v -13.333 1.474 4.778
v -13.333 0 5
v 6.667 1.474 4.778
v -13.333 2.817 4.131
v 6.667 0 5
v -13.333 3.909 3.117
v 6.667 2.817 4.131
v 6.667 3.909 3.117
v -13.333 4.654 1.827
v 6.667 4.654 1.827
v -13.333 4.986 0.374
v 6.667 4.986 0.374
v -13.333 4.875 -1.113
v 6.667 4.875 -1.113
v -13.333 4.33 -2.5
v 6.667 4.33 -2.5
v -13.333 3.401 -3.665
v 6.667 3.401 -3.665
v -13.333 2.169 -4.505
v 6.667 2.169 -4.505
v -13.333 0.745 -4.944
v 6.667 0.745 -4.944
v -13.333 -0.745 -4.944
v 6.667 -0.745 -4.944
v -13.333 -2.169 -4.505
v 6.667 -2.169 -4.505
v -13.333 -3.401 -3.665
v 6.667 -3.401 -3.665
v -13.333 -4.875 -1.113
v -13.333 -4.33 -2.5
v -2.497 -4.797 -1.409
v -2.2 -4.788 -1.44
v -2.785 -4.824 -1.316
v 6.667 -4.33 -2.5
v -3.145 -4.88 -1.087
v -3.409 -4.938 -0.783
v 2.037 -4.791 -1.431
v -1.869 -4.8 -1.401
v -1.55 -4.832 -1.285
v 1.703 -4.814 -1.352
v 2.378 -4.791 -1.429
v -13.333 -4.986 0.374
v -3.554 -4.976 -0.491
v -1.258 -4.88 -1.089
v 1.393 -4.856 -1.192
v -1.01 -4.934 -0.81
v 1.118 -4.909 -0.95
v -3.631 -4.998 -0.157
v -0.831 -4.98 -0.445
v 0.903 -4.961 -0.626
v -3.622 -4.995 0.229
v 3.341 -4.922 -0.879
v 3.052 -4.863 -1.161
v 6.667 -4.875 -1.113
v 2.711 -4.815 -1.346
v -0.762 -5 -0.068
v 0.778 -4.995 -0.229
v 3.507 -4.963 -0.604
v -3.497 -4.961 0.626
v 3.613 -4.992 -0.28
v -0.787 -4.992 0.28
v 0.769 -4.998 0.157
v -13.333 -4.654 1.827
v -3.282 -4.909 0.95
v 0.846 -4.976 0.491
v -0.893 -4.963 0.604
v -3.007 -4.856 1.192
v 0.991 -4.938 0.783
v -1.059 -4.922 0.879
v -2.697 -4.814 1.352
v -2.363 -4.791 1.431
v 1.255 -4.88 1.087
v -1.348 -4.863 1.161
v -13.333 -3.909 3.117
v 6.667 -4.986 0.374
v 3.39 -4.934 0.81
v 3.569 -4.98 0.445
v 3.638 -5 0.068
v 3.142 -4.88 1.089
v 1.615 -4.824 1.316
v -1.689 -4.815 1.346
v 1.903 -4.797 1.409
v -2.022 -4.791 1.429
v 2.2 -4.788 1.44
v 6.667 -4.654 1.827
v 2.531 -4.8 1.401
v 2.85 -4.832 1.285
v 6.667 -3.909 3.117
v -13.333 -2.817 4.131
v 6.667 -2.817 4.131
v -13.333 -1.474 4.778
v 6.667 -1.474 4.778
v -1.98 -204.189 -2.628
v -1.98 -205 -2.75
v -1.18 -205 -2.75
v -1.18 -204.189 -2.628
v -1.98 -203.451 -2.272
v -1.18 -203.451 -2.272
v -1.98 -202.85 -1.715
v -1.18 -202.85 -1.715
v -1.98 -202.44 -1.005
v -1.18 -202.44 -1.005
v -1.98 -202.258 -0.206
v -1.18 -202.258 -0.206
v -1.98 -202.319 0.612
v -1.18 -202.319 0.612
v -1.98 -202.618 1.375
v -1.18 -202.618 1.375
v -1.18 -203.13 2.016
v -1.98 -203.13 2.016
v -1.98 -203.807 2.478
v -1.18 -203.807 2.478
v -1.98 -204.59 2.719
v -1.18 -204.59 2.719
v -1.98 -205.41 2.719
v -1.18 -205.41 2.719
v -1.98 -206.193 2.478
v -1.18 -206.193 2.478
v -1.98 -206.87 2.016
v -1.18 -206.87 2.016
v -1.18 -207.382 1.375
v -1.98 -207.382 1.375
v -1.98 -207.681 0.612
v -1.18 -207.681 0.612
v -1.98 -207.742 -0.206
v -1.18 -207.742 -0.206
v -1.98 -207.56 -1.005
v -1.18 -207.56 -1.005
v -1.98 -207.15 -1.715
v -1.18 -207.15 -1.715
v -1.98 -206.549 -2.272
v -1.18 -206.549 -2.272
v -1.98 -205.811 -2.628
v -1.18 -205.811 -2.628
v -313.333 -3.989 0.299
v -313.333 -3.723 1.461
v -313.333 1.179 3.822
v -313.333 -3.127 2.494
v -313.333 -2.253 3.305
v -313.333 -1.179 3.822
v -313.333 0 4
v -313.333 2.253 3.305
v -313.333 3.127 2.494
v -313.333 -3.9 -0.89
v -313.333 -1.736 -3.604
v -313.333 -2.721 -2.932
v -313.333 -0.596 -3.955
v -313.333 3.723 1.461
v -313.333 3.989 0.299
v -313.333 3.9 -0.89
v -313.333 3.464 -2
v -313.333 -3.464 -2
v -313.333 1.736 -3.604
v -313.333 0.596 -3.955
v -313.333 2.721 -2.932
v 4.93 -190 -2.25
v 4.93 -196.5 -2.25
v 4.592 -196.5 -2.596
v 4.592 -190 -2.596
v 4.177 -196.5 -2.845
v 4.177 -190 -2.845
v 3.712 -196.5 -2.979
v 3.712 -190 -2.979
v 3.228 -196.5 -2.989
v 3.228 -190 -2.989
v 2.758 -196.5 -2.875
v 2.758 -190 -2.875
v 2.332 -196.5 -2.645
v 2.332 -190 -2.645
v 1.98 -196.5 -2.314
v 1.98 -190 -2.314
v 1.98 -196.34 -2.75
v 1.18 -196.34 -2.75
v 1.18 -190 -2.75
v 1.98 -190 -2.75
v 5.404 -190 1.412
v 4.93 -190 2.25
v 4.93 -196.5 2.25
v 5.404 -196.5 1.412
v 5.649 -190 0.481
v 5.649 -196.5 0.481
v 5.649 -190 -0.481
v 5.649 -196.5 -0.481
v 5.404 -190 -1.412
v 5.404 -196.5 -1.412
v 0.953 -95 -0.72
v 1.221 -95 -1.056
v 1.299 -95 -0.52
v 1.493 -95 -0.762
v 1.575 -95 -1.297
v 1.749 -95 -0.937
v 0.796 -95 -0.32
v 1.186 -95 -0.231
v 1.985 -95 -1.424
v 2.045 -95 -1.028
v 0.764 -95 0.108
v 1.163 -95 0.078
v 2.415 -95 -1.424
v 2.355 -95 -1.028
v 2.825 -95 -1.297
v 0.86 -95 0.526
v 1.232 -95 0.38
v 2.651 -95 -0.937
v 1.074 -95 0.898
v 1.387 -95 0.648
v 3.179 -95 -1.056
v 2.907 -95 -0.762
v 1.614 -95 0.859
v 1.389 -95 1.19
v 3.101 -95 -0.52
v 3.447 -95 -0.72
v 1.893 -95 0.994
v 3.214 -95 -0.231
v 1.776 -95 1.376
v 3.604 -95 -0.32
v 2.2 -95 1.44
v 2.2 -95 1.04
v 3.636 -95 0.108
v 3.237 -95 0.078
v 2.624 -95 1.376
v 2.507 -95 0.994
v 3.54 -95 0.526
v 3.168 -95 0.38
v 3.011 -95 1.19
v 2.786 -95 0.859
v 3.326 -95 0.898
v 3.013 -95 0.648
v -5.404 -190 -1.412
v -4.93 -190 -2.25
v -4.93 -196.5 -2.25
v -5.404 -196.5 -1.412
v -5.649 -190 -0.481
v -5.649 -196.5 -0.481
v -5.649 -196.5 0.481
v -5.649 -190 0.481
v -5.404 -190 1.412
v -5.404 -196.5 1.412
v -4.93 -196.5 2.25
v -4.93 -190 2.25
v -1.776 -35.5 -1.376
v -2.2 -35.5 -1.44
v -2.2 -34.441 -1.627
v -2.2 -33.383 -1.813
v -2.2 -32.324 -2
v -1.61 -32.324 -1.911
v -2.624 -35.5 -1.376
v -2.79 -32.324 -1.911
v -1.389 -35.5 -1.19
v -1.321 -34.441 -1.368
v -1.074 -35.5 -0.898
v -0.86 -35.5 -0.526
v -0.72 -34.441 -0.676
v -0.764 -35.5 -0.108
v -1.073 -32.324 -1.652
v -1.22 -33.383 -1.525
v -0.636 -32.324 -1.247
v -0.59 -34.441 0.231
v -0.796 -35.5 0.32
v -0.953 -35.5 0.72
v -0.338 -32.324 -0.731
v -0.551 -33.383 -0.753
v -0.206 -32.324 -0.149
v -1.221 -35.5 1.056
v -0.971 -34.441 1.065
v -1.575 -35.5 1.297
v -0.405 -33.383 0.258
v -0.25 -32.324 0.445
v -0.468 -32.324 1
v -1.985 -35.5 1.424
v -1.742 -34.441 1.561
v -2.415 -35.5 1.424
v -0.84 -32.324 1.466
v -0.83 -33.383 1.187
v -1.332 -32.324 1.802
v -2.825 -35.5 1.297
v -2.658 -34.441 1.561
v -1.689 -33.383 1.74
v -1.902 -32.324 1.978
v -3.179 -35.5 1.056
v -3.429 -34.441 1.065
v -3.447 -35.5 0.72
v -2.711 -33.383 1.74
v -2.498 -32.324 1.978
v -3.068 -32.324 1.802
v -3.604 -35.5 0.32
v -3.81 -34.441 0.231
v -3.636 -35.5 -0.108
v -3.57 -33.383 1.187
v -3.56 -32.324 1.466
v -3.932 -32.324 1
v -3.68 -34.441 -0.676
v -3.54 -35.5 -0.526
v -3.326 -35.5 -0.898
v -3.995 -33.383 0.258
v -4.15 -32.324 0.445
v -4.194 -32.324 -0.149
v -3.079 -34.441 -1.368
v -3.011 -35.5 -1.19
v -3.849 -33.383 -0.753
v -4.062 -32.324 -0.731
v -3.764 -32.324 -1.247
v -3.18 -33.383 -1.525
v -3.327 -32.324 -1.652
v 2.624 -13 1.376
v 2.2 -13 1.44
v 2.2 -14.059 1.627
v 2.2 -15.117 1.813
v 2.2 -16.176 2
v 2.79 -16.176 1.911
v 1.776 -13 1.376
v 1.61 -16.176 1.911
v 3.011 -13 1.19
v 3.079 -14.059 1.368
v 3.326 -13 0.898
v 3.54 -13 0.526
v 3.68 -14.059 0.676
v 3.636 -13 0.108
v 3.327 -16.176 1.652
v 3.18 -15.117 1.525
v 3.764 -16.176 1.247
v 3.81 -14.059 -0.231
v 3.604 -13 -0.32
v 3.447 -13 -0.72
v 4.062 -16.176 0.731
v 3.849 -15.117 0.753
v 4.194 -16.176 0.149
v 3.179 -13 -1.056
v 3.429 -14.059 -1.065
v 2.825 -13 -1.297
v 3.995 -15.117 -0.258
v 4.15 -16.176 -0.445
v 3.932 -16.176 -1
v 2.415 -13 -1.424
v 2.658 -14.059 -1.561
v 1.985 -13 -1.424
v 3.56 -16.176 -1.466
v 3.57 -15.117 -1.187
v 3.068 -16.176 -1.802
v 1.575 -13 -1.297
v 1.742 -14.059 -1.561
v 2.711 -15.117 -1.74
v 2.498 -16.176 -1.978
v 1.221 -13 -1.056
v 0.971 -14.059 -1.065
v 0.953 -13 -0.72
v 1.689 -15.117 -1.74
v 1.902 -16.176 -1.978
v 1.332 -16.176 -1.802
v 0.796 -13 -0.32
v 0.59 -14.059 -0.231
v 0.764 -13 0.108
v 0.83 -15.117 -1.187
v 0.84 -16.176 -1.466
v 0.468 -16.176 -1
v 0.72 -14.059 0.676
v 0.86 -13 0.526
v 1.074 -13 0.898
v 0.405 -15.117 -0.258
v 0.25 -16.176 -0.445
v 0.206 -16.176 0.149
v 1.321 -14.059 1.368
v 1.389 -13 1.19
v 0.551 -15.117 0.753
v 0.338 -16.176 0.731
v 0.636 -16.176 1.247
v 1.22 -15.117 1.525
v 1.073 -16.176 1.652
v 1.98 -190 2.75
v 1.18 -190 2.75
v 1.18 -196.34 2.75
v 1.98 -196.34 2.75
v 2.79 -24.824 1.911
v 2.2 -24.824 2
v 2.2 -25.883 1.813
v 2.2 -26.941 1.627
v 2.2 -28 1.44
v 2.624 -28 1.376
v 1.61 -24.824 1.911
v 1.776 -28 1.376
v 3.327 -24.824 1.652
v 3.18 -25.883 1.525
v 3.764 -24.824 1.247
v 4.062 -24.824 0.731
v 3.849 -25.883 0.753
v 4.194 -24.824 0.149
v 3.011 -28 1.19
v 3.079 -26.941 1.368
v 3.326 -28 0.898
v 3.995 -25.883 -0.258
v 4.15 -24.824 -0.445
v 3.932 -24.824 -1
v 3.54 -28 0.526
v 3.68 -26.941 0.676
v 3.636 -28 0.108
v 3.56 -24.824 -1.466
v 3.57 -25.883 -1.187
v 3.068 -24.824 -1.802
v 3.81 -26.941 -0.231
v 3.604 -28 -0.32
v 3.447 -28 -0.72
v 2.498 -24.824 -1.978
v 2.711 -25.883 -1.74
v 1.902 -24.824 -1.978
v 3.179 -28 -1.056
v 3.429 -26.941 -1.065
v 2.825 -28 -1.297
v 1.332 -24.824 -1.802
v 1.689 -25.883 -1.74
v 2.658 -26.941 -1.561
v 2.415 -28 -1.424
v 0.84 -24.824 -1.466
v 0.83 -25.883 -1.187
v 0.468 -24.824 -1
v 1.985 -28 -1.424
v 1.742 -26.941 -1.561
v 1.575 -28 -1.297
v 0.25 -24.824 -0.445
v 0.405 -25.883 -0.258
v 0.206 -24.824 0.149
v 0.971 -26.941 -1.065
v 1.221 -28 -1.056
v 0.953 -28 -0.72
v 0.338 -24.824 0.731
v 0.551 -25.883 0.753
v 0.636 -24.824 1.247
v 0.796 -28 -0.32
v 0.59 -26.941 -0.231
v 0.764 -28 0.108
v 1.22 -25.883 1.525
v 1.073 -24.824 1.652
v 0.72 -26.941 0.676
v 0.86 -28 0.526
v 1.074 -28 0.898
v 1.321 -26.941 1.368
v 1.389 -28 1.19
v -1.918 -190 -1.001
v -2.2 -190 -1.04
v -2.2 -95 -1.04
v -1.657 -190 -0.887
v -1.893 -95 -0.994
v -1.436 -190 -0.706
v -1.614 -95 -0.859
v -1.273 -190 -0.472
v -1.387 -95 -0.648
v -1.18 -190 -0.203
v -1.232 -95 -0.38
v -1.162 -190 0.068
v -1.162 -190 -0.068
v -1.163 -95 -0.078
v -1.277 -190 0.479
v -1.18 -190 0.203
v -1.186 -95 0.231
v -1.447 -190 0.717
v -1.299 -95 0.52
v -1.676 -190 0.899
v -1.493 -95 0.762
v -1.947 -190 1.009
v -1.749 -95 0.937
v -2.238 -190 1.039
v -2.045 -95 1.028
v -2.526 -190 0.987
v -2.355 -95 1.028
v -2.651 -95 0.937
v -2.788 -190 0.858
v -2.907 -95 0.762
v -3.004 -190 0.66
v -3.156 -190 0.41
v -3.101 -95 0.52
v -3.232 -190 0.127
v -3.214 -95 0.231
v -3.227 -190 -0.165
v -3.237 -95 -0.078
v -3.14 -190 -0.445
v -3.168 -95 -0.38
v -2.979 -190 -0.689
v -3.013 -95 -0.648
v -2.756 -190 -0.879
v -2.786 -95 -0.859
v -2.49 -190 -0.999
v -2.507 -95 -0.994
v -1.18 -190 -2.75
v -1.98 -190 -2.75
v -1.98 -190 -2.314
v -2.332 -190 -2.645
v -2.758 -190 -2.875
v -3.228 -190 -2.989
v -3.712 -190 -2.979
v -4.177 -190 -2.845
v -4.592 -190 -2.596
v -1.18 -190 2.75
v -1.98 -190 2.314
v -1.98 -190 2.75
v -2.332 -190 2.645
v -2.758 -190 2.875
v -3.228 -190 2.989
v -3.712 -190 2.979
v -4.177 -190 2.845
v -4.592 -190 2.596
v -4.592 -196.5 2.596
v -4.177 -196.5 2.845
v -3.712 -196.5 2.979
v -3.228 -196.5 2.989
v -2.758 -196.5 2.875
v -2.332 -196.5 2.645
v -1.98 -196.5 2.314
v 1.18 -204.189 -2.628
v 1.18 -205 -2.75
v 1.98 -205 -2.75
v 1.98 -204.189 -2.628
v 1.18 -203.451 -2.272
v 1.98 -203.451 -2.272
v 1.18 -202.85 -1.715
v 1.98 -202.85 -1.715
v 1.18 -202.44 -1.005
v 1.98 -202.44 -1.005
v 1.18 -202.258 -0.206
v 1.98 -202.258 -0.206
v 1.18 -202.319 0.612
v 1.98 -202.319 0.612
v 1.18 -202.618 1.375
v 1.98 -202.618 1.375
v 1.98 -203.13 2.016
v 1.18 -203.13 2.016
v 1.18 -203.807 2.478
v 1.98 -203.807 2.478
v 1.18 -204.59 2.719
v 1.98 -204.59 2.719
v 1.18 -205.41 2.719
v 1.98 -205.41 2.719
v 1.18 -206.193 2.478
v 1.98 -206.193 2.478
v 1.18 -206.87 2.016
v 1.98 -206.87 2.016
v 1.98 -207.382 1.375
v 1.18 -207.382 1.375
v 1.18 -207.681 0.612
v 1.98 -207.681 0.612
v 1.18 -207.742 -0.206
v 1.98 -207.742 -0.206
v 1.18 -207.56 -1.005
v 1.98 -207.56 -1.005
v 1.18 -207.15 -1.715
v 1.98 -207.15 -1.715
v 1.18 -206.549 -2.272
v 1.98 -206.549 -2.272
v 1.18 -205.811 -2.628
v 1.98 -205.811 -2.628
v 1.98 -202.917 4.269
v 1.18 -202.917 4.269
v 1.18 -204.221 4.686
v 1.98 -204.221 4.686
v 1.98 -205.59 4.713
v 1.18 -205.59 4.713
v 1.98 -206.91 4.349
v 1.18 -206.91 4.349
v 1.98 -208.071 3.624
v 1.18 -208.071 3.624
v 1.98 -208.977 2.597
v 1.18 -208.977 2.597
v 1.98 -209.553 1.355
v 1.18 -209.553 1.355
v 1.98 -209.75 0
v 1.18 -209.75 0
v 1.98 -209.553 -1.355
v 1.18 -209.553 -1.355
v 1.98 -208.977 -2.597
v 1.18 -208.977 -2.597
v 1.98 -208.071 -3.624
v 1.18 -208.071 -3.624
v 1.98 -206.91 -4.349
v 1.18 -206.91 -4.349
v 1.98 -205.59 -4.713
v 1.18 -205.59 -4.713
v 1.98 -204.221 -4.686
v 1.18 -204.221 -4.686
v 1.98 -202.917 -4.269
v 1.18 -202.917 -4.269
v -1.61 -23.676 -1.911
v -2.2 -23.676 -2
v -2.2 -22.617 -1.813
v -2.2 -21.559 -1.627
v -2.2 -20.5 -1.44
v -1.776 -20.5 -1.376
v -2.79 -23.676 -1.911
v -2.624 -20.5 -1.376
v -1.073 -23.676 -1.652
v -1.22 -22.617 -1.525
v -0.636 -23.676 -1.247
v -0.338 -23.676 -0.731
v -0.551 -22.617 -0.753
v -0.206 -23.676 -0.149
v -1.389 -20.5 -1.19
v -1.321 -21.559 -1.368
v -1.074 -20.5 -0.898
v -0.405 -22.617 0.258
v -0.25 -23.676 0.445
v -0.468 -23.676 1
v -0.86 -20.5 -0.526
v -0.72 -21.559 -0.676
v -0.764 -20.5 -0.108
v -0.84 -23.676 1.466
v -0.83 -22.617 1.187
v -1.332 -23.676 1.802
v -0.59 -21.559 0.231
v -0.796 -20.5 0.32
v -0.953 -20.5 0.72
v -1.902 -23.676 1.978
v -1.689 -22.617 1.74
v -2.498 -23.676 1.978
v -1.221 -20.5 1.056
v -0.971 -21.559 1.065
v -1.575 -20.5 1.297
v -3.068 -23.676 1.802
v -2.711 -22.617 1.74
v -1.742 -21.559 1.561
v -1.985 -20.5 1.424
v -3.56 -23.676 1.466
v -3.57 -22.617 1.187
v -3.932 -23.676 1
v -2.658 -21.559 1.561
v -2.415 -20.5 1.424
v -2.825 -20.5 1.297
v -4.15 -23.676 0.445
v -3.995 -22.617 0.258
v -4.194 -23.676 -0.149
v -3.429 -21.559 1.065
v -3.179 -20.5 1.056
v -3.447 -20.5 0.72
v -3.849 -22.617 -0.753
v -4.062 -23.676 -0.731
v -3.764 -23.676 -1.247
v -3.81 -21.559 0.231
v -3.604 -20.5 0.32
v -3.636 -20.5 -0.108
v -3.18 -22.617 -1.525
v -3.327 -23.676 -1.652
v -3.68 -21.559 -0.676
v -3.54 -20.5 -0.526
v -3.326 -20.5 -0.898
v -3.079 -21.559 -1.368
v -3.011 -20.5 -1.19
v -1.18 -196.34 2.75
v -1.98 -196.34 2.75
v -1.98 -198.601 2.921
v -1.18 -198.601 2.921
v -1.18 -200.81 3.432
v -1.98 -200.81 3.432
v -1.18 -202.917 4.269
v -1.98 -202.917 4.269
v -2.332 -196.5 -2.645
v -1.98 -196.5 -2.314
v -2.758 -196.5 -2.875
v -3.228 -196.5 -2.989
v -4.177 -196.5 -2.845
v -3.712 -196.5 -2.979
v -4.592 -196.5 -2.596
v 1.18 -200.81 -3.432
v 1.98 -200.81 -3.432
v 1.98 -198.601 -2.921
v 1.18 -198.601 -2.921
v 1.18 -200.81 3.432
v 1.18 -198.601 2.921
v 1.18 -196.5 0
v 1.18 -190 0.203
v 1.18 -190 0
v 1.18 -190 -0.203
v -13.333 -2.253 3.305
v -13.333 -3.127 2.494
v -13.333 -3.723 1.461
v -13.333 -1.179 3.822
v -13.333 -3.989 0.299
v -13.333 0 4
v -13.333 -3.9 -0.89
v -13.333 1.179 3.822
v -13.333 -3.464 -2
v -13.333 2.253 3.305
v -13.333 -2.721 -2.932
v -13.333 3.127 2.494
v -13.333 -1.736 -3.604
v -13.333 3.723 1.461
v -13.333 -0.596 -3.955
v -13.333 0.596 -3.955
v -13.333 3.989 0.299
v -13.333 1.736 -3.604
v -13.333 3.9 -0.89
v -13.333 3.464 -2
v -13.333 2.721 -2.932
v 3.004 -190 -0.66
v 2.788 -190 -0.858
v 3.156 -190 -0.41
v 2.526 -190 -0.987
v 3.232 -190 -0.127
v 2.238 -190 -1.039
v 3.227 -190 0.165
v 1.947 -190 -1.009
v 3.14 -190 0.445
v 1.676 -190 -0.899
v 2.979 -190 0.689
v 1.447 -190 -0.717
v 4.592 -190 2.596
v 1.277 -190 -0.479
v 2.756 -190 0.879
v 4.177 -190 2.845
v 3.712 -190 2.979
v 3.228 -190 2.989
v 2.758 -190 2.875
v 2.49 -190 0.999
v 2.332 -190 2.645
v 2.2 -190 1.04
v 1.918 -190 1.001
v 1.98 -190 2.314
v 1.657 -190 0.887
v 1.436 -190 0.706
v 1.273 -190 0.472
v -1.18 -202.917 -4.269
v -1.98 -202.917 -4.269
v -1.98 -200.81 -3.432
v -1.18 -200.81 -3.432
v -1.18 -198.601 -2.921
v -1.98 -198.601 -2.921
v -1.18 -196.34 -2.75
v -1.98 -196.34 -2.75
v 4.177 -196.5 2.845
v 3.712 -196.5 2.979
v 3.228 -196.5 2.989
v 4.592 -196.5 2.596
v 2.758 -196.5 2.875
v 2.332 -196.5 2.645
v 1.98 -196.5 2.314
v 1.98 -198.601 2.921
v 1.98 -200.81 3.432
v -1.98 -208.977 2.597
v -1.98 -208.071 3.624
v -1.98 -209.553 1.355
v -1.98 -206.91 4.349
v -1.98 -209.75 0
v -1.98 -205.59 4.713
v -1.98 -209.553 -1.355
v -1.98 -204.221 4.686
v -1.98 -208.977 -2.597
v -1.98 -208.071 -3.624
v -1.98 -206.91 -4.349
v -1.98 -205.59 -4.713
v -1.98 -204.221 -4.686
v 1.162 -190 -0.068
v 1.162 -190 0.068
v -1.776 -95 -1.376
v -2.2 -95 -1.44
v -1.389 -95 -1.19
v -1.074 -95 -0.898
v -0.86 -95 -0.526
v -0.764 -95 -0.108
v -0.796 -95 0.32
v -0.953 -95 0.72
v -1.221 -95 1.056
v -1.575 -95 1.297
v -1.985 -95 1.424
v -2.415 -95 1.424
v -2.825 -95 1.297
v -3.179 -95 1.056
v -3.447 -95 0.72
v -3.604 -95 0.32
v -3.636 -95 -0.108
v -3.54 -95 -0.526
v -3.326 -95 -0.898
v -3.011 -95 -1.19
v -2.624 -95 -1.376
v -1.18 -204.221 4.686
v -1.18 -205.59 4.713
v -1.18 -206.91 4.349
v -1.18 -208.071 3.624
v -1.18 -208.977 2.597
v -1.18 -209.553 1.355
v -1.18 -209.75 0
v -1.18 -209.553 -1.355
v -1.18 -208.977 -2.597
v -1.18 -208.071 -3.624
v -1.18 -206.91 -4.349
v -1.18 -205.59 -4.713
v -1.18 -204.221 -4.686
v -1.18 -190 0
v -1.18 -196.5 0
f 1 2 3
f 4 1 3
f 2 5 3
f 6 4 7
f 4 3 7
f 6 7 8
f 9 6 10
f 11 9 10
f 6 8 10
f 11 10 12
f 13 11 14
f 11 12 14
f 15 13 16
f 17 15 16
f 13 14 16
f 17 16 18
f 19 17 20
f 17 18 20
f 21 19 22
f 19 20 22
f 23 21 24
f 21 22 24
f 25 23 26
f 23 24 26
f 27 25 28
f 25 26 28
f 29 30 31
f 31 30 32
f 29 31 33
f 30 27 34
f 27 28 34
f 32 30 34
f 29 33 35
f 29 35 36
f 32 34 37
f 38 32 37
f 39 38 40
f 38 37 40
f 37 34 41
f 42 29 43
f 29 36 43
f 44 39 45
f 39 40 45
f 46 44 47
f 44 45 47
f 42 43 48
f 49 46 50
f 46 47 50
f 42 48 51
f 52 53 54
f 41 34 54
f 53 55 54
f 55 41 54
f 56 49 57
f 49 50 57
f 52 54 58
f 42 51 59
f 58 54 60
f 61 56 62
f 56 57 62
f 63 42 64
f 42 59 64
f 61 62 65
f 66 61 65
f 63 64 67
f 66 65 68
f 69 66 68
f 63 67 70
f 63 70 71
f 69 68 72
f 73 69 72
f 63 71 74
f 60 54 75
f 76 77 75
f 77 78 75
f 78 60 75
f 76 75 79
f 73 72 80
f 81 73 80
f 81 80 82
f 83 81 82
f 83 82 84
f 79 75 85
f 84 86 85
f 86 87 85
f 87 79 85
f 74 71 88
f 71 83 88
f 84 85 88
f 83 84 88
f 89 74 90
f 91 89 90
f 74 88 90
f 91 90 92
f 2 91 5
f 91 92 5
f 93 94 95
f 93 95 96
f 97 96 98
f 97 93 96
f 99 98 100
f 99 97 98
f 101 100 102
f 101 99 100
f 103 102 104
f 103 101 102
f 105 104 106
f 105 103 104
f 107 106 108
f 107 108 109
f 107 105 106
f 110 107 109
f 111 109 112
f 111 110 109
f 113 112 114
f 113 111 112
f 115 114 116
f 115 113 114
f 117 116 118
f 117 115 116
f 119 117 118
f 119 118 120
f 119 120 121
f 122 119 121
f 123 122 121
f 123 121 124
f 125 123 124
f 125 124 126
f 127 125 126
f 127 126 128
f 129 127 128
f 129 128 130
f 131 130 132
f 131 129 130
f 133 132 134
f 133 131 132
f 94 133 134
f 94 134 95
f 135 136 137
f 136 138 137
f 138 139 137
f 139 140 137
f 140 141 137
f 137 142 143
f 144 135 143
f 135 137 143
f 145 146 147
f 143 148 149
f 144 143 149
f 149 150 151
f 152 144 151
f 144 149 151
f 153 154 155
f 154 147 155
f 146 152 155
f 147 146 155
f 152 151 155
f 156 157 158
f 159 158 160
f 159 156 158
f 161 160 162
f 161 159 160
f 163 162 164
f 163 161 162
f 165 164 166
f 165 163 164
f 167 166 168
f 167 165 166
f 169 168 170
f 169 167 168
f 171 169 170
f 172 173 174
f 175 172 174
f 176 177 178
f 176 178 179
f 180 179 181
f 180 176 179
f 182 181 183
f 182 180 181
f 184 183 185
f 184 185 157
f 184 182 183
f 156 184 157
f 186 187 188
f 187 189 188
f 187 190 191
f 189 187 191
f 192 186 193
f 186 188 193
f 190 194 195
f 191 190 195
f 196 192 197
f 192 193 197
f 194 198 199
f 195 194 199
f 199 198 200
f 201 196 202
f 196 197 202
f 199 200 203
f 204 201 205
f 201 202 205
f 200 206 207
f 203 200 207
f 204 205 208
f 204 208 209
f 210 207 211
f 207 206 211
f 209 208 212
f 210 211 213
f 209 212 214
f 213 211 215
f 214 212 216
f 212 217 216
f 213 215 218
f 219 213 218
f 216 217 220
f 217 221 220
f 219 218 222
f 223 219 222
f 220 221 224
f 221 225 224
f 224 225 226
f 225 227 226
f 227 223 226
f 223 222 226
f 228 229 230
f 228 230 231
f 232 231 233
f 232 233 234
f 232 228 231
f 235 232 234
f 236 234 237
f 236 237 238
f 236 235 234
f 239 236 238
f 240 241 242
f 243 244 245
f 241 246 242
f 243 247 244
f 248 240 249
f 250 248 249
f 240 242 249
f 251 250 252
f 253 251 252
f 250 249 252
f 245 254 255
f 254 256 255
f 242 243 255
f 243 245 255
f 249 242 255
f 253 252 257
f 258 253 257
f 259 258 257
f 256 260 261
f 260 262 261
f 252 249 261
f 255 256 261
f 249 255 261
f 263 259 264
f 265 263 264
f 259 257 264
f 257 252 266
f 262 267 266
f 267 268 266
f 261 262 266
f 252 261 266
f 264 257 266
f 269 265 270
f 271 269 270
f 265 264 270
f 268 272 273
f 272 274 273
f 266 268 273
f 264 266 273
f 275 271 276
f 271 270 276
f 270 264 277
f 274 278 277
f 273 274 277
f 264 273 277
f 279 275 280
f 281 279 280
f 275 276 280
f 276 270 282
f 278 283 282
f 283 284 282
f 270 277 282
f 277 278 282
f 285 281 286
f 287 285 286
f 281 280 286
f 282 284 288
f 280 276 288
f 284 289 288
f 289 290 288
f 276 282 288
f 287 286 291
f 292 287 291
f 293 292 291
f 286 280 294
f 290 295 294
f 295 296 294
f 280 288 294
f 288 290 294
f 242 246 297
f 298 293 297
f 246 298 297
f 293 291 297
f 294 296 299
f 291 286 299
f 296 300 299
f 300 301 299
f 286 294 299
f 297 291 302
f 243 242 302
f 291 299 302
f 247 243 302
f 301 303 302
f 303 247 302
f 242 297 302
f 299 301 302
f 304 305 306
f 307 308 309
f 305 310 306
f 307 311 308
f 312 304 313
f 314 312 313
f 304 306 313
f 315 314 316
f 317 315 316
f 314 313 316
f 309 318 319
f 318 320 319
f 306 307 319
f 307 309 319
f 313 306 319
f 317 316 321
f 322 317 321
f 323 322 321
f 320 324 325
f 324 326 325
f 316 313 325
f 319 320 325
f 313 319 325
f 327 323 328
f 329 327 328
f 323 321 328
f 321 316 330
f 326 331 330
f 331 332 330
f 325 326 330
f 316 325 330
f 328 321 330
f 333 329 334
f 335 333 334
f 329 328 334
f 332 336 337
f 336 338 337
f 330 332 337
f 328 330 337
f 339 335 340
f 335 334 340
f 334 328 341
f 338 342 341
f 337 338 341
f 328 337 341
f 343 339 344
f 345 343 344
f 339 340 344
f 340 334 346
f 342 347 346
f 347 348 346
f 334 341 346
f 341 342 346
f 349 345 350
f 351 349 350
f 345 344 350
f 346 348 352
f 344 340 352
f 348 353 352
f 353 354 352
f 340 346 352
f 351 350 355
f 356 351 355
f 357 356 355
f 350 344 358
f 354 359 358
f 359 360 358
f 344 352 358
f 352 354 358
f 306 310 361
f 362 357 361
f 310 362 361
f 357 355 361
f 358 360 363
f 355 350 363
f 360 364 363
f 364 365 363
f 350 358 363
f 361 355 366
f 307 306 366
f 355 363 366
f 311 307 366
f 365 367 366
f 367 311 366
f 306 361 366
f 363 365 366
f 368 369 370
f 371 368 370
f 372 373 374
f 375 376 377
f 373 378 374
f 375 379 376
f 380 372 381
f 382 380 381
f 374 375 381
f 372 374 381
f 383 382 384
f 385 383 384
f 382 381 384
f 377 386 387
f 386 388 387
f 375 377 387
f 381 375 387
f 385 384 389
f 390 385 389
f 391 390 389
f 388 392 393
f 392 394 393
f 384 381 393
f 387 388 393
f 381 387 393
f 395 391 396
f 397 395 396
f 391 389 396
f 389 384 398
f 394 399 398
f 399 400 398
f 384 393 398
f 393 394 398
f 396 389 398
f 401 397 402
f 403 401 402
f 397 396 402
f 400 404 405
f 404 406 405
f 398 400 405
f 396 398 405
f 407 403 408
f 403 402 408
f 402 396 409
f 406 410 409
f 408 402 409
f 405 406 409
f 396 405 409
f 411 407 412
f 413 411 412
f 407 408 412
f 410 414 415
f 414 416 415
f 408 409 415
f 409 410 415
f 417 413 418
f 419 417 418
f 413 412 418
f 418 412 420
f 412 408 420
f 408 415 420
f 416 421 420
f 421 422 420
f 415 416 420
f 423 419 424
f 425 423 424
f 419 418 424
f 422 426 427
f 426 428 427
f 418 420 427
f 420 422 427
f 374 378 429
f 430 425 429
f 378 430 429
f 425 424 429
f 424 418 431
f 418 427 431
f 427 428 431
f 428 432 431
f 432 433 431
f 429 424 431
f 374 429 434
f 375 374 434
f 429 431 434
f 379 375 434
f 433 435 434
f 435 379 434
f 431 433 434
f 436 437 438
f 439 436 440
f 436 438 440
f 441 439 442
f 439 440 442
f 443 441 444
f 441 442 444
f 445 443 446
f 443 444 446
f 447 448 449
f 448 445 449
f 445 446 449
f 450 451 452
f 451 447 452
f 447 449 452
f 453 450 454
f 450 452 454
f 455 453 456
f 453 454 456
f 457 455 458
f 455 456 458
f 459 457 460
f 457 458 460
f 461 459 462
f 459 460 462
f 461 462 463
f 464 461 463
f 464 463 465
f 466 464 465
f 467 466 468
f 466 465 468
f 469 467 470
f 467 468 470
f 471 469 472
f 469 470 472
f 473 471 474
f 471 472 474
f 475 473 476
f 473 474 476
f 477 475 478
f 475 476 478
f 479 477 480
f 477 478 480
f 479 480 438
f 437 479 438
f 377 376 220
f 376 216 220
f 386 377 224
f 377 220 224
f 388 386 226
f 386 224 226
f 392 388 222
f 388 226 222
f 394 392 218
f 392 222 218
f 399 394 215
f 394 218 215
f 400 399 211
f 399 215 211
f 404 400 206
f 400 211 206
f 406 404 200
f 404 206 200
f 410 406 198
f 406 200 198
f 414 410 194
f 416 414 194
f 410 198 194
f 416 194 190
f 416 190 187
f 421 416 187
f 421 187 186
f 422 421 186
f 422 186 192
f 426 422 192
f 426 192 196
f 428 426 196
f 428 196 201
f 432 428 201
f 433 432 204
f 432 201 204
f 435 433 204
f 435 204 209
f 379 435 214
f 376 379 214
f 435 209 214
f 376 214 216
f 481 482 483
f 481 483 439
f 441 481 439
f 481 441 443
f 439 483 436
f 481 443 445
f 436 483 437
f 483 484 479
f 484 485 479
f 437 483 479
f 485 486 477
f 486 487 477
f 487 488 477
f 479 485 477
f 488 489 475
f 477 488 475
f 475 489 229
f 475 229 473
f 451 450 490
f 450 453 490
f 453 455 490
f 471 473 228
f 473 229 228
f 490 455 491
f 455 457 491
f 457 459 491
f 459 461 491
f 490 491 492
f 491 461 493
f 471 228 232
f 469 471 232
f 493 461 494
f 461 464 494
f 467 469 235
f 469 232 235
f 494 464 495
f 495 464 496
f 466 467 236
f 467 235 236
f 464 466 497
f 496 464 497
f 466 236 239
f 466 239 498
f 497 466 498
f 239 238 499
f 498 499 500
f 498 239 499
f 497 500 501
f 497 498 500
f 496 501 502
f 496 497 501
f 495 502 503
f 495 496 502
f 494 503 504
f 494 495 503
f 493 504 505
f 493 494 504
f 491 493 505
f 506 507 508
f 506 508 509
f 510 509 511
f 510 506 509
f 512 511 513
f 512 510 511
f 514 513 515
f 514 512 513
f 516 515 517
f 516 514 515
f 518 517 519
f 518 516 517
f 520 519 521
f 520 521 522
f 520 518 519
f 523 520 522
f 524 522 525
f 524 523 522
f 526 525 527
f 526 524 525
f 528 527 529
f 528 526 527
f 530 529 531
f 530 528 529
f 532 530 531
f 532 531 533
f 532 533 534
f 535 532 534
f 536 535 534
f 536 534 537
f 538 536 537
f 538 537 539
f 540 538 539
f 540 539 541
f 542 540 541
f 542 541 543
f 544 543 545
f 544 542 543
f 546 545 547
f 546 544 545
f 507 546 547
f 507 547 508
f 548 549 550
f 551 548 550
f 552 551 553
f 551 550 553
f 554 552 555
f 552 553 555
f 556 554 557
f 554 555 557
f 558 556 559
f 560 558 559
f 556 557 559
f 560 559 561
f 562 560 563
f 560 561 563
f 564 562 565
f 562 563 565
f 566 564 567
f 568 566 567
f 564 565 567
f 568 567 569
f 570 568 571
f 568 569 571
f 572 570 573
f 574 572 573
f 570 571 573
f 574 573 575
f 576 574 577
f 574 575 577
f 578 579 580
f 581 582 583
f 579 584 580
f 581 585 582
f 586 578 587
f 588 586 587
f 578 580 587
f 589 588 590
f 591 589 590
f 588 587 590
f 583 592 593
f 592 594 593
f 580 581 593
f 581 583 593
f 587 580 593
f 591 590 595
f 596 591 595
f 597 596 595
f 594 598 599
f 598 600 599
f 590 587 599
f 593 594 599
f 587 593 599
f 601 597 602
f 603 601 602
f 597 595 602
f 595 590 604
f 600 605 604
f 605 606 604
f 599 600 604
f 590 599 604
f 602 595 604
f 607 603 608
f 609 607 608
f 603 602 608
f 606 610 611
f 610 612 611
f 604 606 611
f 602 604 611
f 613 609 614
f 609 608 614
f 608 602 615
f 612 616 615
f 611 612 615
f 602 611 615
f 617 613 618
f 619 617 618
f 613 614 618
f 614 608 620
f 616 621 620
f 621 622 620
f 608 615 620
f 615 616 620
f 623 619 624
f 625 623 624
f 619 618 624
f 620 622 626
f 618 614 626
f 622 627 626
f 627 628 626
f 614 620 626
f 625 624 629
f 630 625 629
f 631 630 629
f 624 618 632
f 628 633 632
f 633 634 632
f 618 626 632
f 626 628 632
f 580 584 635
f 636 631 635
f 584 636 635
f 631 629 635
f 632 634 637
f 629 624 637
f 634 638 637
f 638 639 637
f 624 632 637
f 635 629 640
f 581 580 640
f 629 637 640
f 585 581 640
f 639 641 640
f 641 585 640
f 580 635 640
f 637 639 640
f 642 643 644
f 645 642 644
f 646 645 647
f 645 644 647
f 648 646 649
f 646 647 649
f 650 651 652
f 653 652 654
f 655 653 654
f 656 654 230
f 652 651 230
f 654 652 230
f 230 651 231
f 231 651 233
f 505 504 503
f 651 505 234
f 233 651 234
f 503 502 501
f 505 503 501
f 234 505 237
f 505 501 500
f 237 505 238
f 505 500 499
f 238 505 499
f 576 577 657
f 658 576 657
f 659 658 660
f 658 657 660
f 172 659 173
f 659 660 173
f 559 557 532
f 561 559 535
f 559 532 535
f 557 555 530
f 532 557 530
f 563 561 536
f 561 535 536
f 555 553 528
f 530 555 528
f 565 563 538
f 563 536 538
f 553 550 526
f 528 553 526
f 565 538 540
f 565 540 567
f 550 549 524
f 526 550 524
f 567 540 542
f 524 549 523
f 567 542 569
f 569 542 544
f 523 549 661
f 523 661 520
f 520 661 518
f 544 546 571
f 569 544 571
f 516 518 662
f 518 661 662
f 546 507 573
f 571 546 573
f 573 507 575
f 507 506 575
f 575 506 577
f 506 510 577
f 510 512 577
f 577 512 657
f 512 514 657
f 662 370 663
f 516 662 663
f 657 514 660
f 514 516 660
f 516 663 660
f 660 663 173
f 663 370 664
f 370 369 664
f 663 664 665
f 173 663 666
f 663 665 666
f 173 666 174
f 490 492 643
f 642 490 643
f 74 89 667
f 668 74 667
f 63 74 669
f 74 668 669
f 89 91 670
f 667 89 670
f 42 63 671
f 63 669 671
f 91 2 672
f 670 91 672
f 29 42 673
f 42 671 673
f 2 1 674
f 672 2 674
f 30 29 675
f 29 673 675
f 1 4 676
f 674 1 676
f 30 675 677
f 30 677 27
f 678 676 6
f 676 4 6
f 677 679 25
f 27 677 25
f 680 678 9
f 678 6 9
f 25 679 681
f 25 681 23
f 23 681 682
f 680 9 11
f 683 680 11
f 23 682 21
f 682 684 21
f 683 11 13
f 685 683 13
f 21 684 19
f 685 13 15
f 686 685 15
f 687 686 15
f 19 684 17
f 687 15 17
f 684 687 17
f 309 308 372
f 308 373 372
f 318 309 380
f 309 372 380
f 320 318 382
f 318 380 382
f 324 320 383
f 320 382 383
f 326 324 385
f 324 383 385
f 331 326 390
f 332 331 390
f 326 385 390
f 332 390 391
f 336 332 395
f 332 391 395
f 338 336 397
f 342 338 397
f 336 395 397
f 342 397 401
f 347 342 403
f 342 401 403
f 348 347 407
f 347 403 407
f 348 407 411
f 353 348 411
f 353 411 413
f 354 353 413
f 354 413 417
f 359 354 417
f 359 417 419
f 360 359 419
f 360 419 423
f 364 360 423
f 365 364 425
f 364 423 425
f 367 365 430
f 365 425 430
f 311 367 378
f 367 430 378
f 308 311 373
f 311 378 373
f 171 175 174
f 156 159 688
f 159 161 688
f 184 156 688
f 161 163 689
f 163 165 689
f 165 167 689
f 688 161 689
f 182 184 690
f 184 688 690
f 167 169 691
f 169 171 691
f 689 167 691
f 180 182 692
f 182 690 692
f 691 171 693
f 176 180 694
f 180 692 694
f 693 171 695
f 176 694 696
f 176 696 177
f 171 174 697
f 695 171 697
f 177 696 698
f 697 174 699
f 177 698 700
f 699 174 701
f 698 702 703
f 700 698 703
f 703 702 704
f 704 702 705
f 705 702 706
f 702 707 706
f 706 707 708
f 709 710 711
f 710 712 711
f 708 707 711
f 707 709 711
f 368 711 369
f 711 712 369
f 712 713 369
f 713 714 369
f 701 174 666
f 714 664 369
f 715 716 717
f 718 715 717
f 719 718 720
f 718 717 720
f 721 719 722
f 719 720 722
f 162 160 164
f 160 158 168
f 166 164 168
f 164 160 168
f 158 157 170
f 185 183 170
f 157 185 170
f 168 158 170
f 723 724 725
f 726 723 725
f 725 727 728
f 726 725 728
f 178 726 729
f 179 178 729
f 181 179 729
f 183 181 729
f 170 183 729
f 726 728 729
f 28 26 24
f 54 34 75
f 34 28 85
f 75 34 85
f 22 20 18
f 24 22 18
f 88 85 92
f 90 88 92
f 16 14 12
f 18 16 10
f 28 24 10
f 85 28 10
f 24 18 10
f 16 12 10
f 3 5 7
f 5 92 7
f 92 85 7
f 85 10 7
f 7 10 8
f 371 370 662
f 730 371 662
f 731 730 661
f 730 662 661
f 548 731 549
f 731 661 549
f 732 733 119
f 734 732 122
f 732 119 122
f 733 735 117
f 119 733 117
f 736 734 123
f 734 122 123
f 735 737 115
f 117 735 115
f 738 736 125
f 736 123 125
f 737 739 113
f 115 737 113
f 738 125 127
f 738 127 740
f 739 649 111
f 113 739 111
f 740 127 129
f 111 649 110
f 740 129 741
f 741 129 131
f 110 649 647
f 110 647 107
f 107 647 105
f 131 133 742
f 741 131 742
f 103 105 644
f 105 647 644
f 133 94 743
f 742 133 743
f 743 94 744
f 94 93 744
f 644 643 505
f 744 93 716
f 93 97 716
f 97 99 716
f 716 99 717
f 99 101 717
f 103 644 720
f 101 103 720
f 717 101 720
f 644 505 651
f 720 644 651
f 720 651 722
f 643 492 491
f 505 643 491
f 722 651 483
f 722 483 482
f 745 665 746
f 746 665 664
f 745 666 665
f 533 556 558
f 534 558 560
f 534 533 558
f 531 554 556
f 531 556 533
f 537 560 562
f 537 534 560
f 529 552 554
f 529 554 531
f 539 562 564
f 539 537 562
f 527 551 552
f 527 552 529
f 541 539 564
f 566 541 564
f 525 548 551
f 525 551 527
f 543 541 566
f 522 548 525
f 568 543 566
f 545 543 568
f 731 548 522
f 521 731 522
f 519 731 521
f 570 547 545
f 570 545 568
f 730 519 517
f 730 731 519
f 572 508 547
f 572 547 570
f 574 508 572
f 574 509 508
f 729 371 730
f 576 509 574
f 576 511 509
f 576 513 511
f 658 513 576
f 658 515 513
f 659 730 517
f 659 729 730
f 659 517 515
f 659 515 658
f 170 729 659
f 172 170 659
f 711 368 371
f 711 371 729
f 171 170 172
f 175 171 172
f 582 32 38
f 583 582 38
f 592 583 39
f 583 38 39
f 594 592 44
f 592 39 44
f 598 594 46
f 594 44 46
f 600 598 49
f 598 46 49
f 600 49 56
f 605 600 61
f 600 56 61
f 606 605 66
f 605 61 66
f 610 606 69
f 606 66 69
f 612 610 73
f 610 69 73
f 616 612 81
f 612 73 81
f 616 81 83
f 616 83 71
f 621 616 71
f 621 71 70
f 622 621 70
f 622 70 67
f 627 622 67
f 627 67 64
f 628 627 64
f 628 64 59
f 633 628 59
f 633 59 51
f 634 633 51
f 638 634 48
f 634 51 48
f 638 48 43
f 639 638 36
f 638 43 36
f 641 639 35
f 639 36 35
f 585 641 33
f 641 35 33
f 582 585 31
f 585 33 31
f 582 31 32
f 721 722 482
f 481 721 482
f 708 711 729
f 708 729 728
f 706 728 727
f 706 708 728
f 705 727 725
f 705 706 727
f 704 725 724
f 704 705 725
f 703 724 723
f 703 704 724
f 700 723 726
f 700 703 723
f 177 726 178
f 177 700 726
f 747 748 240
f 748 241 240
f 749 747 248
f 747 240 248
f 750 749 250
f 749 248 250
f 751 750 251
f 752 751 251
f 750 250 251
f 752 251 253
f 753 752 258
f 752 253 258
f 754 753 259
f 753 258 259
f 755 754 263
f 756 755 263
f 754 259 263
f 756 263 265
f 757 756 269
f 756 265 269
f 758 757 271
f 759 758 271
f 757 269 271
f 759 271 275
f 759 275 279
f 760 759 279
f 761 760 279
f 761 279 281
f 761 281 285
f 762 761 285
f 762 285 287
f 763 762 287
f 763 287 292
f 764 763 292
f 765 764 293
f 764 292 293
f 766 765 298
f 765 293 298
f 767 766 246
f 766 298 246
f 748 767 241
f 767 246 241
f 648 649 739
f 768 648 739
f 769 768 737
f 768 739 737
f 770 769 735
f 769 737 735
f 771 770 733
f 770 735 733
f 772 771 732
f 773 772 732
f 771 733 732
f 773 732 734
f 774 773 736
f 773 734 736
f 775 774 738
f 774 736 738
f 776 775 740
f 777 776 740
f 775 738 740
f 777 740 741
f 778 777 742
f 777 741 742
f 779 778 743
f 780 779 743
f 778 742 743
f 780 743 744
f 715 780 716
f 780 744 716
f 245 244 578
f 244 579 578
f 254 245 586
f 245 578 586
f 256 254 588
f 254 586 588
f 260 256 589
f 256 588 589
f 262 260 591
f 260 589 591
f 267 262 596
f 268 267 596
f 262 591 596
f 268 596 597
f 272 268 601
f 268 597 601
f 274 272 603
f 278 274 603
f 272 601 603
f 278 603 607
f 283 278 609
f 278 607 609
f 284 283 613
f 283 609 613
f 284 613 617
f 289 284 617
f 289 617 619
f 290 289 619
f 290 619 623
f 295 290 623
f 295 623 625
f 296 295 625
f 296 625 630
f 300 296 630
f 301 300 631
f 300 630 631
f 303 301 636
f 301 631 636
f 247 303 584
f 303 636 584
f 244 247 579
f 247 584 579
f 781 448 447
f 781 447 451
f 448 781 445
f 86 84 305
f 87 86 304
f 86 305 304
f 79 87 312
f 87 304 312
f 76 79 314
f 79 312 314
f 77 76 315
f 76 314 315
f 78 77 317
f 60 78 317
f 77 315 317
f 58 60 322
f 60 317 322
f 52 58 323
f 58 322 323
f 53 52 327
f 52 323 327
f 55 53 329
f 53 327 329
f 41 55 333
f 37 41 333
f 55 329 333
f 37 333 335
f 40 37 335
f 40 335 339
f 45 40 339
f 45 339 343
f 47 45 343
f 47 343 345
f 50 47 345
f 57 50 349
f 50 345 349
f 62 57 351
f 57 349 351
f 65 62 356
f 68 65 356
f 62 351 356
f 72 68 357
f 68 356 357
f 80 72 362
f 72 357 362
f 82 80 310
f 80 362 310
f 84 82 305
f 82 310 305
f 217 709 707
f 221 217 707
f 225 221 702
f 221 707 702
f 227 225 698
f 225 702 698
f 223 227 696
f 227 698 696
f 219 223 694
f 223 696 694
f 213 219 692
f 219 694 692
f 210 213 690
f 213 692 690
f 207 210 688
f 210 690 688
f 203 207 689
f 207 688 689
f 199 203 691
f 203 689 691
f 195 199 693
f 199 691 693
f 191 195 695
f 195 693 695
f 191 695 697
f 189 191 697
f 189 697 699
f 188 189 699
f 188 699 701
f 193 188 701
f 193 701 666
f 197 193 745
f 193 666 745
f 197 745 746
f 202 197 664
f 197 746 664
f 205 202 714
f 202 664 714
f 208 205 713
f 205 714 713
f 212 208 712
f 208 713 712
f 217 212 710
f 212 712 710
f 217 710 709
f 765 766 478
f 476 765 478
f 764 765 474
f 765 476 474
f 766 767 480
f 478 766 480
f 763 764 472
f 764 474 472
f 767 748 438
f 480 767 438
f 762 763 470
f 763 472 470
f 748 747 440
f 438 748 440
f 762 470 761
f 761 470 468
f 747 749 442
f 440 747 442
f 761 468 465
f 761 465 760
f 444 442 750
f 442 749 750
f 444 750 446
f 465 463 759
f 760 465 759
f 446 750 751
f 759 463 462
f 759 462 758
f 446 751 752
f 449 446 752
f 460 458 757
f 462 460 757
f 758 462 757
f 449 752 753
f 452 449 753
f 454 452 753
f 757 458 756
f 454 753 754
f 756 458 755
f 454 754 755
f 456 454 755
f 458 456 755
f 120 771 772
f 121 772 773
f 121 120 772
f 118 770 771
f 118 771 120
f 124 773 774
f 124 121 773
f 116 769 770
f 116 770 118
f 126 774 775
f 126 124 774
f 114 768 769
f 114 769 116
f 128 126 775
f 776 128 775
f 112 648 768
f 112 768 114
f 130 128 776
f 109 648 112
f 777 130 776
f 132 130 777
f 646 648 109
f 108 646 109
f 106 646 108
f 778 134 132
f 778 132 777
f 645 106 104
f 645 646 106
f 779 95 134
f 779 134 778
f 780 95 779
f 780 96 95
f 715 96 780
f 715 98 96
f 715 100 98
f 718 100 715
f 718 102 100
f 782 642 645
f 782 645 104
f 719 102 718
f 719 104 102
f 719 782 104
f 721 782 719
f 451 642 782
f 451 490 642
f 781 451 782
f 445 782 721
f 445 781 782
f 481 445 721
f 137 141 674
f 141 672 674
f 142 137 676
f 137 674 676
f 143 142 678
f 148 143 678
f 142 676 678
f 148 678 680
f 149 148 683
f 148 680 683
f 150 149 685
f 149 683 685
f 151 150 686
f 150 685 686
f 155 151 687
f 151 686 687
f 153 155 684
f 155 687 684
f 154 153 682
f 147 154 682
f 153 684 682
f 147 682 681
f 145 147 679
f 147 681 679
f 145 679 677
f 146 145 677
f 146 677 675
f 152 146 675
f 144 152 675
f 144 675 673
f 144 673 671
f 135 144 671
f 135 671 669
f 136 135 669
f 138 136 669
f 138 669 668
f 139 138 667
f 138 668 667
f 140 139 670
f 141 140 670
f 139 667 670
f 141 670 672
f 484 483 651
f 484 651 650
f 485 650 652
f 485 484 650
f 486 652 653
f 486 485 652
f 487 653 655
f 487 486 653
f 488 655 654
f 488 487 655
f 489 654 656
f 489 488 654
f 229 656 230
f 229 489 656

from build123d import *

# Parameters (mm, degrees)
SKETCH4_R           = 25.817449465
CUT_EXTRUDE1_DEPTH  = 20
BOSS_EXTRUDE2_DEPTH = 6.5
BOSS_EXTRUDE3_DEPTH = 6.5
SKETCH7_R           = 2.75
BOSS_EXTRUDE4_DEPTH = 0.8
BOSS_EXTRUDE5_START = -0.8
SKETCH8_R           = 2.75
BOSS_EXTRUDE5_DEPTH = 0.8


with BuildPart() as part:
    # Sketch1 → Revolve1 (revolve)
    with BuildSketch(Plane.XY, mode=Mode.PRIVATE) as revolve1_sk:
        Polygon((-313.333333333, 0), (-313.333333333, 4), (-13.333333333, 4), (-13.333333333, 5), (6.666666667, 5), (6.666666667, 0), align=None)
    revolve(revolve1_sk.sketch.rotate(Axis((6.666666667, 0, 0), (-1, 0, 0)), 270), axis=Axis((6.666666667, 0, 0), (-1, 0, 0)))

    # Sketch2 → Revolve2 (revolve)
    with BuildSketch(Plane.XY, mode=Mode.PRIVATE) as revolve2_sk:
        Polygon((2.2, -4), (3.64, -4), (3.64, -13), (4.2, -16.175917819), (4.2, -24.824082181), (3.64, -28), (3.64, -95), (3.24, -95), (3.24, -195), (2.2, -195), align=None)
    revolve(revolve2_sk.sketch.rotate(Axis((2.2, -195, 0), (0, 1, 0)), 270), axis=Axis((2.2, -195, 0), (0, 1, 0)))

    # Sketch3 → Revolve3 (revolve)
    with BuildSketch(Plane.XY, mode=Mode.PRIVATE) as revolve3_sk:
        Polygon((-2.2, -195), (-3.24, -195), (-3.24, -95), (-3.64, -95), (-3.64, -35.5), (-4.2, -32.324082181), (-4.2, -23.675917819), (-3.64, -20.5), (-3.64, -4), (-2.2, -4), align=None)
    revolve(revolve3_sk.sketch.rotate(Axis((-2.2, -4, 0), (0, -1, 0)), 90), axis=Axis((-2.2, -4, 0), (0, -1, 0)))

    # Sketch4 → Cut-Extrude1 (cut)
    with BuildSketch(Plane(origin=(0, -190, 0), x_dir=(-1, 0, 0), z_dir=(0, 1, 0))):
        Circle(SKETCH4_R)
    extrude(amount=-CUT_EXTRUDE1_DEPTH, mode=Mode.SUBTRACT)

    # Sketch5 → Boss-Extrude2 (add)
    with BuildSketch(Plane(origin=(0, -190, 0), x_dir=(-1, 0, 0), z_dir=(0, 1, 0))):
        with BuildLine():
            ThreePointArc((-1.930000033, -2.250000045), (-1.18, 2e-09), (-1.930000036, 2.250000048))
            ThreePointArc((-1.930000036, 2.250000048), (-3.43000003, 3), (-4.93, 2.25))
            ThreePointArc((-4.93, 2.25), (-5.68, 0), (-4.93, -2.25))
            ThreePointArc((-4.93, -2.25), (-3.430000028, -3), (-1.930000033, -2.250000045))
        make_face()
    extrude(amount=-BOSS_EXTRUDE2_DEPTH)

    # Sketch6 → Boss-Extrude3 (add)
    with BuildSketch(Plane(origin=(0, -190, 0), x_dir=(-1, 0, 0), z_dir=(0, 1, 0))):
        with BuildLine():
            ThreePointArc((4.929999975, -2.250000034), (5.68, -2.1e-08), (4.93, 2.25))
            ThreePointArc((4.93, 2.25), (3.430000035, 3), (1.930000042, 2.250000056))
            ThreePointArc((1.930000042, 2.250000056), (1.18, 5e-09), (1.930000036, -2.250000048))
            ThreePointArc((1.930000036, -2.250000048), (3.430000009, -3), (4.929999975, -2.250000034))
        make_face()
    extrude(amount=-BOSS_EXTRUDE3_DEPTH)

    # Sketch7 → Boss-Extrude4 (add)
    with BuildSketch(Plane(origin=(1.18, 0, 0), x_dir=(0, 0, -1), z_dir=(1, 0, 0))):
        with BuildLine():
            Line((2.75, -196.339745962), (2.75, -190))
            Line((2.75, -190), (-2.75, -190))
            Line((-2.75, -190), (-2.75, -196.339745962))
            ThreePointArc((-2.75, -196.339745962), (-3.134679445, -199.715009665), (-4.268987342, -202.917154092))
            ThreePointArc((-4.268987342, -202.917154092), (0, -209.75), (4.268987342, -202.917154092))
            ThreePointArc((4.268987342, -202.917154092), (3.134679445, -199.715009665), (2.75, -196.339745962))
        make_face()
        with Locations((0, -205)):
            Circle(SKETCH7_R, mode=Mode.SUBTRACT)
    extrude(amount=BOSS_EXTRUDE4_DEPTH)

    # Sketch8 → Boss-Extrude5 (add)
    with BuildSketch(Plane(origin=(-1.18, 0, 0), x_dir=(0, 0, -1), z_dir=(1, 0, 0)).offset(BOSS_EXTRUDE5_START)):
        with BuildLine():
            Line((2.75, -196.339745962), (2.75, -190))
            Line((2.75, -190), (-2.75, -190))
            Line((-2.75, -190), (-2.75, -196.339745962))
            ThreePointArc((-2.75, -196.339745962), (-3.134679445, -199.715009665), (-4.268987342, -202.917154092))
            ThreePointArc((-4.268987342, -202.917154092), (0, -209.75), (4.268987342, -202.917154092))
            ThreePointArc((4.268987342, -202.917154092), (3.134679445, -199.715009665), (2.75, -196.339745962))
        make_face()
        with Locations((0, -205)):
            Circle(SKETCH8_R, mode=Mode.SUBTRACT)
    extrude(amount=BOSS_EXTRUDE5_DEPTH)


solid = part.part
